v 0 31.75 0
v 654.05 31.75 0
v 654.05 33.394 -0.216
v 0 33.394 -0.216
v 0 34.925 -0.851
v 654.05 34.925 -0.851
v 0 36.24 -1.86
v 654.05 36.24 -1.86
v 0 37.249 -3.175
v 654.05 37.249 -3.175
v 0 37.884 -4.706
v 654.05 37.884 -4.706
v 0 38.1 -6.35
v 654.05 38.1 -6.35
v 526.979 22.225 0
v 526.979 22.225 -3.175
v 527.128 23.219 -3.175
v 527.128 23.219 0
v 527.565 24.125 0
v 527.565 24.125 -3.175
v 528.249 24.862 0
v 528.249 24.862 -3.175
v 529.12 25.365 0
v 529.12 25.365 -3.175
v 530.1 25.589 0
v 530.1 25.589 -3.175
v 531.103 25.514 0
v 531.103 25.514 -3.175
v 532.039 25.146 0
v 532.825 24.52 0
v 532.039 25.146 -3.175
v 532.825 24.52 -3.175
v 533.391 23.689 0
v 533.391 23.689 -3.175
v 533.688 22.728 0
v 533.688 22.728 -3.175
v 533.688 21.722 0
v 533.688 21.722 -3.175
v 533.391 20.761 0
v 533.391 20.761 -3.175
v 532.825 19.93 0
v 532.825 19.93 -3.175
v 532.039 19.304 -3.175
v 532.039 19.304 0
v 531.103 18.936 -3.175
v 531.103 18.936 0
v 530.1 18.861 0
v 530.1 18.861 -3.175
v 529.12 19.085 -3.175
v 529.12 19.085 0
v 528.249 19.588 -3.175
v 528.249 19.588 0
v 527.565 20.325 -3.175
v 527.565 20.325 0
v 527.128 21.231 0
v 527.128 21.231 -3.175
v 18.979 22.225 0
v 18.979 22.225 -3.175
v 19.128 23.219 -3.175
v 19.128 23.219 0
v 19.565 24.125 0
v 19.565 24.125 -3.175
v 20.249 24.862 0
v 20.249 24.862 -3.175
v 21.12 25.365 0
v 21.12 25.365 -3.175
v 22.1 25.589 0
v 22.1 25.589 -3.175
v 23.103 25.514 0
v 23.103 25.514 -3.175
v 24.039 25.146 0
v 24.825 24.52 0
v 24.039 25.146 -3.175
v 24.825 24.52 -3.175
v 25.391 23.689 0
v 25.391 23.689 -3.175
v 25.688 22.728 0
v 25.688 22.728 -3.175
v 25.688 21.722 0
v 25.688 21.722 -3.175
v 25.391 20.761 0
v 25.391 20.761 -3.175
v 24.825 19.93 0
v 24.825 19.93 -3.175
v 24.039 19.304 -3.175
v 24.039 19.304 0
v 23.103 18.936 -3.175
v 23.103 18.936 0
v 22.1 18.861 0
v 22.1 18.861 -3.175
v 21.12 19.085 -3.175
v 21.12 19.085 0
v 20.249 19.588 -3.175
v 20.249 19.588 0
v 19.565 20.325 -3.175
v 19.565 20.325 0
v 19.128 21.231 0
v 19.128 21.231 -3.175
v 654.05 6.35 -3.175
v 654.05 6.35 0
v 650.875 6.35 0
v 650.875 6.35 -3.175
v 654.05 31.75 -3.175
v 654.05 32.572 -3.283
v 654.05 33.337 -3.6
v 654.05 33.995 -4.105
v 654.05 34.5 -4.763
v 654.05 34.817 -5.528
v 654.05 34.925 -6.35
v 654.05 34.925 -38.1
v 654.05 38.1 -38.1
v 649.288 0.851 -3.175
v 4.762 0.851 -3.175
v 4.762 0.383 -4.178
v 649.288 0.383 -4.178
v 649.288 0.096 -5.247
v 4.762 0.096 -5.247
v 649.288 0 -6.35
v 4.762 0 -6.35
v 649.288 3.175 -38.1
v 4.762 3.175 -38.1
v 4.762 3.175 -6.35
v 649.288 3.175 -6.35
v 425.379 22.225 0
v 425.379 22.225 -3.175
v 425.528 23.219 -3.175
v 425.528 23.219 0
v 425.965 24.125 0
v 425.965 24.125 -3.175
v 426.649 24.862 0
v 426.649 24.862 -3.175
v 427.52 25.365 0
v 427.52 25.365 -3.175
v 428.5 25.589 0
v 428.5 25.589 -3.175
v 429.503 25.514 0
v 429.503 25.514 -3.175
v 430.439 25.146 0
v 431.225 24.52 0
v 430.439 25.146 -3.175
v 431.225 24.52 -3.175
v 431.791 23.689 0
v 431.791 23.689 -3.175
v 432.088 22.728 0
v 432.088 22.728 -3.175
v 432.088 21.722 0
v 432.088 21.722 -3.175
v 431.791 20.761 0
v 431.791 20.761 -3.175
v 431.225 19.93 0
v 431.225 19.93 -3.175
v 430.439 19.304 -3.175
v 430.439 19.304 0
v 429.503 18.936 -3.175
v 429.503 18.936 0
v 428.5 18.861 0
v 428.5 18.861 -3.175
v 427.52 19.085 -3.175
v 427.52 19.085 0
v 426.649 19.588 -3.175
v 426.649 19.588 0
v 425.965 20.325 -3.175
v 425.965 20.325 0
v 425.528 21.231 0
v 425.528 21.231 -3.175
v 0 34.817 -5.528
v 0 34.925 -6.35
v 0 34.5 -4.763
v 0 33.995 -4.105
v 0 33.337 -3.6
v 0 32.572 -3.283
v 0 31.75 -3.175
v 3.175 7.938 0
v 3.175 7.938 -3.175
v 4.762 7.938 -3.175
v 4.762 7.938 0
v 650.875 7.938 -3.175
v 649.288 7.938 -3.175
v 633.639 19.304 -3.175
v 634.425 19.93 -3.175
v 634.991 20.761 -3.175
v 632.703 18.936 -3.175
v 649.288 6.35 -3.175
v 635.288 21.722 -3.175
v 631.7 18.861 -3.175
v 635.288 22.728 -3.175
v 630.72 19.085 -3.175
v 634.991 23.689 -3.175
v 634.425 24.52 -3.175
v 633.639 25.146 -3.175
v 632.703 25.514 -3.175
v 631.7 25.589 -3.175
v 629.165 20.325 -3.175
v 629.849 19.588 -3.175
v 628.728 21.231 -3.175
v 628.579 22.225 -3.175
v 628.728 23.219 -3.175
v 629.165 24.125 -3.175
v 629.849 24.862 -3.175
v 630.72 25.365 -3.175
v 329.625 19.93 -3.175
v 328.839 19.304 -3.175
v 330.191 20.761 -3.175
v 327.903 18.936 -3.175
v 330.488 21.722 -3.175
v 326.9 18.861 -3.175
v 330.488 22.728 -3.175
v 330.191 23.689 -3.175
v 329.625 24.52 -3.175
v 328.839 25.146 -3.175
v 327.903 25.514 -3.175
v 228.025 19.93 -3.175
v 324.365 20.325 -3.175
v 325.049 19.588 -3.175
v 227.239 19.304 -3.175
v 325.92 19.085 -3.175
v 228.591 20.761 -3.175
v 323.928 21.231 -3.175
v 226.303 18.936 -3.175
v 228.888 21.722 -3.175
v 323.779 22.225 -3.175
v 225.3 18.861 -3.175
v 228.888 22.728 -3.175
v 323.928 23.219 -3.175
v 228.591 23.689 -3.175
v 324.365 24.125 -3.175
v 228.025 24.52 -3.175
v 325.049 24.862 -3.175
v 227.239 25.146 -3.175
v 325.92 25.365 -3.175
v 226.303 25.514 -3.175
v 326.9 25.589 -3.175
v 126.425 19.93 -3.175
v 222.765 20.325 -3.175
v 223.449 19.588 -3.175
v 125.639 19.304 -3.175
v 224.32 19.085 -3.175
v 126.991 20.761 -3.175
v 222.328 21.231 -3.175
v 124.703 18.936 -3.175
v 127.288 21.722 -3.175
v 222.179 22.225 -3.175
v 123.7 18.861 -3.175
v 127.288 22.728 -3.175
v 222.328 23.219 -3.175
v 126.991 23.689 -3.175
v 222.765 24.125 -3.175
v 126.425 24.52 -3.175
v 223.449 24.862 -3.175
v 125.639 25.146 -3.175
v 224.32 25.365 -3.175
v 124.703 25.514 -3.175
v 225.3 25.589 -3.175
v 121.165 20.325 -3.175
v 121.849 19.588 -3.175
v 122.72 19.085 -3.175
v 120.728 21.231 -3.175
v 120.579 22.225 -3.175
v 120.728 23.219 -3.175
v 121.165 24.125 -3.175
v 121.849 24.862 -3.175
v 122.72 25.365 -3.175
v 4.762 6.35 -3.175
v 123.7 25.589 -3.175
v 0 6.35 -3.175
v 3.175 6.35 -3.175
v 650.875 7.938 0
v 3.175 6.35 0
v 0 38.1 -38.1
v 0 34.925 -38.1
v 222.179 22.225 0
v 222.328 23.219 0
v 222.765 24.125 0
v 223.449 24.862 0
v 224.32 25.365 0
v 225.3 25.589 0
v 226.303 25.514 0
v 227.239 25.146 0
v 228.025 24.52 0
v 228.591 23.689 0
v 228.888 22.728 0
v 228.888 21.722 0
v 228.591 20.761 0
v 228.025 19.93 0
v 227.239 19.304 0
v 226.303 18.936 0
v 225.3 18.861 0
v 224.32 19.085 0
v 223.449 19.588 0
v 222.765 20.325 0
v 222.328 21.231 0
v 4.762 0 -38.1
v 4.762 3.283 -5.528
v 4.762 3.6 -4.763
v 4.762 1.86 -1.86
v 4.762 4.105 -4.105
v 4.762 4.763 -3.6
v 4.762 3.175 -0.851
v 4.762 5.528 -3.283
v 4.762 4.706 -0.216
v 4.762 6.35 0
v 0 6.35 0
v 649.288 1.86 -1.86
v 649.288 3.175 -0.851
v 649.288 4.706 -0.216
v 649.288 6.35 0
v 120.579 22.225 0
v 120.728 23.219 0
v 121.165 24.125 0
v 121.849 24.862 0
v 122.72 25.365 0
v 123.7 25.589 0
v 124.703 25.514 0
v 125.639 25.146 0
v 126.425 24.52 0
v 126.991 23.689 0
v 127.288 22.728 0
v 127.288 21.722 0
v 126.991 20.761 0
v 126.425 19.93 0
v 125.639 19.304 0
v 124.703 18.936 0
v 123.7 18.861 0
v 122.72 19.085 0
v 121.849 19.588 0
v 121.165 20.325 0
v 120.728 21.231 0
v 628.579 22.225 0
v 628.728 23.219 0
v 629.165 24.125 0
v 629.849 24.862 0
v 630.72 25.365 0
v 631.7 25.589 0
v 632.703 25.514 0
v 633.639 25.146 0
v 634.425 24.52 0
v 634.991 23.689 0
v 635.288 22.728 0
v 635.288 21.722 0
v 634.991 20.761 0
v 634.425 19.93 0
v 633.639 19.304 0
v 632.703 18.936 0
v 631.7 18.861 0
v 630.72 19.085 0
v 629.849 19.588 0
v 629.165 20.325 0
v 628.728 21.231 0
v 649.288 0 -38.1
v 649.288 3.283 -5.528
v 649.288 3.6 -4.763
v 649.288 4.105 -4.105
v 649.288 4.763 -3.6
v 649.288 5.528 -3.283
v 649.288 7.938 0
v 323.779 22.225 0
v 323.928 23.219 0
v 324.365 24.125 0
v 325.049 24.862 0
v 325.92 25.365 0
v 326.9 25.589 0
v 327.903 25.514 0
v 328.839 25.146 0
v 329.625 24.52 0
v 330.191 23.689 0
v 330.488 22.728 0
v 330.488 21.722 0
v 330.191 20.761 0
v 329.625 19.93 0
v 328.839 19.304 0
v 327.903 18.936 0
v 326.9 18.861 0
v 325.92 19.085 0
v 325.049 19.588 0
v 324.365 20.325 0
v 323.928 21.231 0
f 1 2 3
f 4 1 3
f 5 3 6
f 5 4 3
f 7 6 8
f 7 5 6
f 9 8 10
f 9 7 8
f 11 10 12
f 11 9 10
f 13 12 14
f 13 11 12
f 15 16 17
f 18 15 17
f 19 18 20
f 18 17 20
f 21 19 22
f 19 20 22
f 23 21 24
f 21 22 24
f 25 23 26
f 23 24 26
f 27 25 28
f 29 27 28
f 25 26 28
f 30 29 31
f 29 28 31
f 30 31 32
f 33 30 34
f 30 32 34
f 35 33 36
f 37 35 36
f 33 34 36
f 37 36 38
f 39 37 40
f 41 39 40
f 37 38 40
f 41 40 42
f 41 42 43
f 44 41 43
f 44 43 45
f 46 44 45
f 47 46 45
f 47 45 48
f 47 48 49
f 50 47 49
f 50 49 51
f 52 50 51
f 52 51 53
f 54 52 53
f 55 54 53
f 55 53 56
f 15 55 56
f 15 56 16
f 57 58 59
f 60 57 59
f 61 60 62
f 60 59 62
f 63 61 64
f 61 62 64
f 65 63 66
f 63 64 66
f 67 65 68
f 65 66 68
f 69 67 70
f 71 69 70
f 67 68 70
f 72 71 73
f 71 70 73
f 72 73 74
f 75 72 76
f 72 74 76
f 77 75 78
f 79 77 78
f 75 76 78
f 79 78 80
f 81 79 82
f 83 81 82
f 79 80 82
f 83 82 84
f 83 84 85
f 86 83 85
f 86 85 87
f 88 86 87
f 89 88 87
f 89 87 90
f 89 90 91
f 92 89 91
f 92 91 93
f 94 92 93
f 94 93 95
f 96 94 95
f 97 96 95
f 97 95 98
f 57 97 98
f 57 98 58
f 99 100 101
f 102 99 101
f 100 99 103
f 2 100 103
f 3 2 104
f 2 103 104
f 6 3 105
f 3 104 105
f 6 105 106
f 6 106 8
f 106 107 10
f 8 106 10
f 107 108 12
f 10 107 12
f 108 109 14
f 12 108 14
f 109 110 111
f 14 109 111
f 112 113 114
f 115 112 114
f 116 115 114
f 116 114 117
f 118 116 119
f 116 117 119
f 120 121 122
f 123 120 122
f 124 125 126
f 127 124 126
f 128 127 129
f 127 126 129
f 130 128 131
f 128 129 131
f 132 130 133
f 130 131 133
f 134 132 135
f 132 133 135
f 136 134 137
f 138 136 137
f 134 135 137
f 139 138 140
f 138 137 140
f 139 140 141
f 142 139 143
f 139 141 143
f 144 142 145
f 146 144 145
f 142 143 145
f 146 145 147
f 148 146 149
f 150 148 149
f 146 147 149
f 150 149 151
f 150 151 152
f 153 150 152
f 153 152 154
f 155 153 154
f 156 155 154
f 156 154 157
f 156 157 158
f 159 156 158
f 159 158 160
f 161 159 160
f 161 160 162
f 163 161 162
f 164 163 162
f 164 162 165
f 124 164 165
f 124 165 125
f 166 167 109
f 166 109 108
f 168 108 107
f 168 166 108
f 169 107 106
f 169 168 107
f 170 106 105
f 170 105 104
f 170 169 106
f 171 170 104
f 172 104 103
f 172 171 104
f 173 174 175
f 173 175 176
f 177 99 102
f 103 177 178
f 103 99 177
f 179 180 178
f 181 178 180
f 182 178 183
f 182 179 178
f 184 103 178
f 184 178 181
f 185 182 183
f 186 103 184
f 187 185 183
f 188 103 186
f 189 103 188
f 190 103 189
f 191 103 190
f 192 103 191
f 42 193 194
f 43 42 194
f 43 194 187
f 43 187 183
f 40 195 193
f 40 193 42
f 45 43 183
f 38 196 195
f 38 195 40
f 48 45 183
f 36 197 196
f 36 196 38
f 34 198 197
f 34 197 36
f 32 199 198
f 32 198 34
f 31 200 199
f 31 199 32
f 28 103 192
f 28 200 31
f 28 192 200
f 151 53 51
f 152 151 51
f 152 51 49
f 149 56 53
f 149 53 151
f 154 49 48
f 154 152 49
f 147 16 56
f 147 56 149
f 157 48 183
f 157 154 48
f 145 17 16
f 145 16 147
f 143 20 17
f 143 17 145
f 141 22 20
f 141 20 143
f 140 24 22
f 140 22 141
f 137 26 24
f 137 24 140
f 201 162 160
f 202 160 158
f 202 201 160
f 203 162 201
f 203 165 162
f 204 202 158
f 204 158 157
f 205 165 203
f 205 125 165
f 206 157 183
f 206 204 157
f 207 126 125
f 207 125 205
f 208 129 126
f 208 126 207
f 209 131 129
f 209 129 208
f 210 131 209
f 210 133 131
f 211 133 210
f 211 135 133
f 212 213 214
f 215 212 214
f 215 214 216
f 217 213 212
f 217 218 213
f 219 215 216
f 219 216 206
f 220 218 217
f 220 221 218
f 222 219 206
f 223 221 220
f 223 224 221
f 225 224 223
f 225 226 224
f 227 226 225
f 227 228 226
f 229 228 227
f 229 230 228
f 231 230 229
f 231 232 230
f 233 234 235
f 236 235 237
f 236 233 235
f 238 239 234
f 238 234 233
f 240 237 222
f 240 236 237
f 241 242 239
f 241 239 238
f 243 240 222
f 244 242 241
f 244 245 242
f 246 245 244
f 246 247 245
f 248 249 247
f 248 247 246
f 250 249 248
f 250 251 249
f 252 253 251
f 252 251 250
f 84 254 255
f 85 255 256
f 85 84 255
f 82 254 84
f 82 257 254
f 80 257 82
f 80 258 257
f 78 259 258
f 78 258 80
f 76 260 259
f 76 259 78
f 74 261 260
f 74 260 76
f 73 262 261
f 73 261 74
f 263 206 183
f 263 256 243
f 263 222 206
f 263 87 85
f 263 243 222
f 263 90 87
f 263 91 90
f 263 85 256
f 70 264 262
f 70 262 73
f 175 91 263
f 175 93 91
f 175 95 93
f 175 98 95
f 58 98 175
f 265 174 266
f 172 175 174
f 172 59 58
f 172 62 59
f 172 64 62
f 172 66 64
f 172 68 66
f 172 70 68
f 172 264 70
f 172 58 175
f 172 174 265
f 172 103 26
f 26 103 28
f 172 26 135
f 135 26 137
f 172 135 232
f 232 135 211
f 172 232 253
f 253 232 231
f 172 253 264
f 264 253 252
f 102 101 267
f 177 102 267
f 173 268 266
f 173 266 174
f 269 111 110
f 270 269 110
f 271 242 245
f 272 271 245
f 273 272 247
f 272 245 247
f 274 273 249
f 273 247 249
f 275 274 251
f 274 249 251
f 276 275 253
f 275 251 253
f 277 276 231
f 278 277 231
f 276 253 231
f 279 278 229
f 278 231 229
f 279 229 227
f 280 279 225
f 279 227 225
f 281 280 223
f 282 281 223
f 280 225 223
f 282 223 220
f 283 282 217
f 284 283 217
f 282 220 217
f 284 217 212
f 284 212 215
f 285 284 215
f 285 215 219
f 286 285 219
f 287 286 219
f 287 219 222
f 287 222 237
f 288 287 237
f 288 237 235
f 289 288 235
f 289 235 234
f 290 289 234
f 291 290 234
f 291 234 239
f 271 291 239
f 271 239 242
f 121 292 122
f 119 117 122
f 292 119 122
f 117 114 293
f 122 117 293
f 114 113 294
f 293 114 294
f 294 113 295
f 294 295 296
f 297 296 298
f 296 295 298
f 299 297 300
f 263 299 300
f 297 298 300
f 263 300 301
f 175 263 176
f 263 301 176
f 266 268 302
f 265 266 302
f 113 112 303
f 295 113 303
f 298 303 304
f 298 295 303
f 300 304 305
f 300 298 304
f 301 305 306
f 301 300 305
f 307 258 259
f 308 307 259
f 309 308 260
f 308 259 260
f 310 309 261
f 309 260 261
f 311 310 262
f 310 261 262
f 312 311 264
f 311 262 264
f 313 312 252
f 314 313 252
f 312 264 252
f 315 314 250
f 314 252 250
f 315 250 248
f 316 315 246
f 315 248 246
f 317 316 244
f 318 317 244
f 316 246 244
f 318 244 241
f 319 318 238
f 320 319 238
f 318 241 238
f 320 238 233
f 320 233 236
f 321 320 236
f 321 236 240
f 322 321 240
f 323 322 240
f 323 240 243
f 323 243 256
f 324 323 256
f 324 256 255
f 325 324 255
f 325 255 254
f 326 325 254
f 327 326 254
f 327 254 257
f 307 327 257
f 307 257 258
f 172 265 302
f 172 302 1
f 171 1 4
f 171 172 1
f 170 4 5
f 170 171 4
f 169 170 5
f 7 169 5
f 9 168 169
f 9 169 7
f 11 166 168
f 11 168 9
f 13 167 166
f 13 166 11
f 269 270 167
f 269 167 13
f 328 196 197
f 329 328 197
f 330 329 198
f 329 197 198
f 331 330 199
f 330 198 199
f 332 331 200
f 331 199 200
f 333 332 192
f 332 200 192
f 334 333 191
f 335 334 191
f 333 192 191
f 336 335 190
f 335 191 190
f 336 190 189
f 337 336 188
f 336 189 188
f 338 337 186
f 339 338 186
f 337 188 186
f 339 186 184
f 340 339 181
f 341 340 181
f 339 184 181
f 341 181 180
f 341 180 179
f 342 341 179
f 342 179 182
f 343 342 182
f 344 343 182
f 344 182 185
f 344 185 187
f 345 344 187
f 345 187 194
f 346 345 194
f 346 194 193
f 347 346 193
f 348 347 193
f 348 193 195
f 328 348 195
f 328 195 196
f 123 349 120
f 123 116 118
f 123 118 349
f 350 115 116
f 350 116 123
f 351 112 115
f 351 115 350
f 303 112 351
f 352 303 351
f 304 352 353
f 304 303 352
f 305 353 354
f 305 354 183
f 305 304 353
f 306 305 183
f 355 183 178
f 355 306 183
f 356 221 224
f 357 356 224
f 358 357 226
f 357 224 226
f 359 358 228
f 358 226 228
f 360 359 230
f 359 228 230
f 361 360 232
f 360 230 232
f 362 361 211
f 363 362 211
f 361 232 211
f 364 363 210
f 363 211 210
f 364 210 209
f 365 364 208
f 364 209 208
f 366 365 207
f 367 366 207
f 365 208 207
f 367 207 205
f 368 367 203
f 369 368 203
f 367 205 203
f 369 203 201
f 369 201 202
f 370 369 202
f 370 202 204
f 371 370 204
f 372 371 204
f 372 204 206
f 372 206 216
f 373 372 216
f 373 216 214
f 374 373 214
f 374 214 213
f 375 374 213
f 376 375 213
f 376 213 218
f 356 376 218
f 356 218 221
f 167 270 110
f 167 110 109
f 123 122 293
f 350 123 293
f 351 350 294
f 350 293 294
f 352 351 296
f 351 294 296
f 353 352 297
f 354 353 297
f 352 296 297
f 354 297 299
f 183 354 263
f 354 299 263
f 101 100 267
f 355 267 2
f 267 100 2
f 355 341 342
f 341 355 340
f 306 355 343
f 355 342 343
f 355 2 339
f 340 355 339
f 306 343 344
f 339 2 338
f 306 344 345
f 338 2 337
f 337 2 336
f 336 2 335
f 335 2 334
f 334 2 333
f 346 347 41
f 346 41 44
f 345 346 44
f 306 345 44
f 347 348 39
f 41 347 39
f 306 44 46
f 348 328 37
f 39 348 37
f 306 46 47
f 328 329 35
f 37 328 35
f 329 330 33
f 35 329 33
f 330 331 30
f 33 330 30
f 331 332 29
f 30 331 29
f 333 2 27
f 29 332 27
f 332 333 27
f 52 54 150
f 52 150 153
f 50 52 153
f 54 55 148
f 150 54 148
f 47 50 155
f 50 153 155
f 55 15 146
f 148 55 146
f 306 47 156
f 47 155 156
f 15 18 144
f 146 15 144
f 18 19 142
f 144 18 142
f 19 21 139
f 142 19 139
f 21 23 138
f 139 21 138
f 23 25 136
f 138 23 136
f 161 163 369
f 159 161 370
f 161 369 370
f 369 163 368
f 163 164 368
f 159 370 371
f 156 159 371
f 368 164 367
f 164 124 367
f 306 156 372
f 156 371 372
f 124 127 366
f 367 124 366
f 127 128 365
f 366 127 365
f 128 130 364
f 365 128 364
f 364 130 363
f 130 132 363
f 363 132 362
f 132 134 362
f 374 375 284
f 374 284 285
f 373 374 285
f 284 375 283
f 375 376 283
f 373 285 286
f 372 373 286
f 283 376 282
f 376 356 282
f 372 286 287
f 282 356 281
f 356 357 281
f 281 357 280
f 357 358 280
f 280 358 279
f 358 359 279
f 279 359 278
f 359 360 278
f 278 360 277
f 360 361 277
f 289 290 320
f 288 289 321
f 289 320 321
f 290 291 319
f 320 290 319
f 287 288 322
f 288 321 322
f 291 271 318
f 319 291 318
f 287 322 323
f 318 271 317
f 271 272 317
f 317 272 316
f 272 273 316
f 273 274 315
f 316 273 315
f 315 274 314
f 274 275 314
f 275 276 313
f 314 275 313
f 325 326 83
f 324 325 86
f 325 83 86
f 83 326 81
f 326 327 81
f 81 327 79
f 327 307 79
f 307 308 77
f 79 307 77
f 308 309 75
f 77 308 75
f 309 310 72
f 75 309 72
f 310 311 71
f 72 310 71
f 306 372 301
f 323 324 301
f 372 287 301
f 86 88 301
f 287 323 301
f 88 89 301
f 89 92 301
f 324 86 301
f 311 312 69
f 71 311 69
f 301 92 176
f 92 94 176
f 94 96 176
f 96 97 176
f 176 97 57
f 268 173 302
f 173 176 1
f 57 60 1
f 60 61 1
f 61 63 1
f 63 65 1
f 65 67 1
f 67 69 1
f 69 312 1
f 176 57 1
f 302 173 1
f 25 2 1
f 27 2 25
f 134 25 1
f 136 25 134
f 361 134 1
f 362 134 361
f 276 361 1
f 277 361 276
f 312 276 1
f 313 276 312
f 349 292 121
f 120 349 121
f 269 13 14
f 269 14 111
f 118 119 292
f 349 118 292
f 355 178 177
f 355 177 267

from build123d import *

# Parameters (mm, degrees)
BASE_FLANGE1_DEPTH               = 3.175
EDGE_FLANGE1_STRIP_W             = 19.05
EDGE_FLANGE1_STRIP_H             = 3.175
EDGE_FLANGE1_STRIP_CUT_DEPTH     = 654.05
EDGE_FLANGE1_DEPTH               = 654.05
EDGE_FLANGE2_START               = 4.7625
EDGE_FLANGE2_DEPTH               = 644.525
EDGE_FLANGE2_START_2             = 3.175
EDGE_FLANGE2_2_OUTLINE_W         = 1.5875
EDGE_FLANGE2_2_OUTLINE_H         = 3.175
EDGE_FLANGE2_2_DEPTH             = 1.5875
EDGE_FLANGE2_START_3             = 649.2875
EDGE_FLANGE2_3_OUTLINE_W         = 1.5875
EDGE_FLANGE2_3_OUTLINE_H         = 3.175
EDGE_FLANGE2_3_DEPTH             = 1.5875
EDGE_FLANGE2_4_DEPTH             = 644.525
F_17_64_0_26563_DIAMETER_HOLE1_D = 6.746875
LPATTERN1_COUNT                  = 7
LPATTERN1_PITCH                  = 101.6


# Read off the part's stored shape, not the designer's step: Edge-Flange2
# Sheet-metal steps are written as plain solids
with BuildPart() as part:
    # Sketch2 → Base-Flange1 (new body)
    with BuildSketch(Plane.XY):
        Polygon((4.7625, 0), (4.7625, 6.35), (0, 6.35), (0, 38.1), (654.05, 38.1), (654.05, 6.35), (649.2875, 6.35), (649.2875, 0), align=None)
    extrude(amount=-BASE_FLANGE1_DEPTH)

    # Edge-Flange1 strip (across the edge) → Edge-Flange1 strip cut (cut)
    with BuildSketch(Plane(origin=(0, 38.1, -3.175), x_dir=(0, -1, 0), z_dir=(1, 0, 0))):
        with Locations((-3.175, -1.5875)):
            Rectangle(EDGE_FLANGE1_STRIP_W, EDGE_FLANGE1_STRIP_H)
    extrude(amount=EDGE_FLANGE1_STRIP_CUT_DEPTH, mode=Mode.SUBTRACT)

    # Edge-Flange1 section (across the edge) → Edge-Flange1 (add)
    with BuildSketch(Plane(origin=(0, 38.1, -3.175), x_dir=(0, -1, 0), z_dir=(1, 0, 0))):
        with BuildLine():
            Line((0, 3.175), (0, 34.925))
            Line((0, 34.925), (3.175, 34.925))
            Line((3.175, 34.925), (3.175, 3.175))
            ThreePointArc((3.175, 3.175), (4.10493597, 0.92993597), (6.35, 0))
            Line((6.35, 0), (6.35, -3.175))
            ThreePointArc((6.35, -3.175), (1.859871939, -1.315128061), (0, 3.175))
        make_face()
    extrude(amount=EDGE_FLANGE1_DEPTH)

    # Edge-Flange2 outline → Edge-Flange2 (cut)
    with BuildSketch(Plane.YZ.offset(EDGE_FLANGE2_START)):
        with BuildLine():
            Line((0, -3.175), (0.850738685, -3.175))
            ThreePointArc((0.850738685, -3.175), (3.174999999, -0.850738686), (6.35, 0))
            Line((6.35, 0), (0, 0))
            Line((0, 0), (0, -3.175))
        make_face()
    extrude(amount=EDGE_FLANGE2_DEPTH, mode=Mode.SUBTRACT)

    # Edge-Flange2 2 outline → Edge-Flange2 2 (cut)
    with BuildSketch(Plane.YZ.offset(EDGE_FLANGE2_START_2)):
        with Locations((7.14375, -1.5875)):
            Rectangle(EDGE_FLANGE2_2_OUTLINE_W, EDGE_FLANGE2_2_OUTLINE_H)
    extrude(amount=EDGE_FLANGE2_2_DEPTH, mode=Mode.SUBTRACT)

    # Edge-Flange2 3 outline → Edge-Flange2 3 (cut)
    with BuildSketch(Plane.YZ.offset(EDGE_FLANGE2_START_3)):
        with Locations((7.14375, -1.5875)):
            Rectangle(EDGE_FLANGE2_3_OUTLINE_W, EDGE_FLANGE2_3_OUTLINE_H)
    extrude(amount=EDGE_FLANGE2_3_DEPTH, mode=Mode.SUBTRACT)

    # Edge-Flange2 4 outline → Edge-Flange2 4 (add)
    with BuildSketch(Plane.YZ.offset(EDGE_FLANGE2_START)):
        with BuildLine():
            Line((0, -38.1), (3.175, -38.1))
            Line((3.175, -38.1), (3.175, -6.35))
            ThreePointArc((3.175, -6.35), (4.10493597, -4.10493597), (6.35, -3.175))
            Line((6.35, -3.175), (0.850738685, -3.175))
            ThreePointArc((0.850738685, -3.175), (0.216371003, -4.706499064), (0, -6.35))
            Line((0, -6.35), (0, -38.1))
        make_face()
    extrude(amount=EDGE_FLANGE2_4_DEPTH)

    # 17/64 (0.26563) Diameter Hole1 (through all)
    with Locations(Plane.XY):
        with Locations((22.352, 22.225)):
            f_17_64_0_26563_diameter_hole1 = Hole(F_17_64_0_26563_DIAMETER_HOLE1_D / 2)

    # LPattern1: 17/64 (0.26563) Diameter Hole1 ×7
    with Locations(*[(i * LPATTERN1_PITCH, 0, 0) for i in range(1, LPATTERN1_COUNT)]):
        add(f_17_64_0_26563_diameter_hole1, mode=Mode.SUBTRACT)


solid = part.part
